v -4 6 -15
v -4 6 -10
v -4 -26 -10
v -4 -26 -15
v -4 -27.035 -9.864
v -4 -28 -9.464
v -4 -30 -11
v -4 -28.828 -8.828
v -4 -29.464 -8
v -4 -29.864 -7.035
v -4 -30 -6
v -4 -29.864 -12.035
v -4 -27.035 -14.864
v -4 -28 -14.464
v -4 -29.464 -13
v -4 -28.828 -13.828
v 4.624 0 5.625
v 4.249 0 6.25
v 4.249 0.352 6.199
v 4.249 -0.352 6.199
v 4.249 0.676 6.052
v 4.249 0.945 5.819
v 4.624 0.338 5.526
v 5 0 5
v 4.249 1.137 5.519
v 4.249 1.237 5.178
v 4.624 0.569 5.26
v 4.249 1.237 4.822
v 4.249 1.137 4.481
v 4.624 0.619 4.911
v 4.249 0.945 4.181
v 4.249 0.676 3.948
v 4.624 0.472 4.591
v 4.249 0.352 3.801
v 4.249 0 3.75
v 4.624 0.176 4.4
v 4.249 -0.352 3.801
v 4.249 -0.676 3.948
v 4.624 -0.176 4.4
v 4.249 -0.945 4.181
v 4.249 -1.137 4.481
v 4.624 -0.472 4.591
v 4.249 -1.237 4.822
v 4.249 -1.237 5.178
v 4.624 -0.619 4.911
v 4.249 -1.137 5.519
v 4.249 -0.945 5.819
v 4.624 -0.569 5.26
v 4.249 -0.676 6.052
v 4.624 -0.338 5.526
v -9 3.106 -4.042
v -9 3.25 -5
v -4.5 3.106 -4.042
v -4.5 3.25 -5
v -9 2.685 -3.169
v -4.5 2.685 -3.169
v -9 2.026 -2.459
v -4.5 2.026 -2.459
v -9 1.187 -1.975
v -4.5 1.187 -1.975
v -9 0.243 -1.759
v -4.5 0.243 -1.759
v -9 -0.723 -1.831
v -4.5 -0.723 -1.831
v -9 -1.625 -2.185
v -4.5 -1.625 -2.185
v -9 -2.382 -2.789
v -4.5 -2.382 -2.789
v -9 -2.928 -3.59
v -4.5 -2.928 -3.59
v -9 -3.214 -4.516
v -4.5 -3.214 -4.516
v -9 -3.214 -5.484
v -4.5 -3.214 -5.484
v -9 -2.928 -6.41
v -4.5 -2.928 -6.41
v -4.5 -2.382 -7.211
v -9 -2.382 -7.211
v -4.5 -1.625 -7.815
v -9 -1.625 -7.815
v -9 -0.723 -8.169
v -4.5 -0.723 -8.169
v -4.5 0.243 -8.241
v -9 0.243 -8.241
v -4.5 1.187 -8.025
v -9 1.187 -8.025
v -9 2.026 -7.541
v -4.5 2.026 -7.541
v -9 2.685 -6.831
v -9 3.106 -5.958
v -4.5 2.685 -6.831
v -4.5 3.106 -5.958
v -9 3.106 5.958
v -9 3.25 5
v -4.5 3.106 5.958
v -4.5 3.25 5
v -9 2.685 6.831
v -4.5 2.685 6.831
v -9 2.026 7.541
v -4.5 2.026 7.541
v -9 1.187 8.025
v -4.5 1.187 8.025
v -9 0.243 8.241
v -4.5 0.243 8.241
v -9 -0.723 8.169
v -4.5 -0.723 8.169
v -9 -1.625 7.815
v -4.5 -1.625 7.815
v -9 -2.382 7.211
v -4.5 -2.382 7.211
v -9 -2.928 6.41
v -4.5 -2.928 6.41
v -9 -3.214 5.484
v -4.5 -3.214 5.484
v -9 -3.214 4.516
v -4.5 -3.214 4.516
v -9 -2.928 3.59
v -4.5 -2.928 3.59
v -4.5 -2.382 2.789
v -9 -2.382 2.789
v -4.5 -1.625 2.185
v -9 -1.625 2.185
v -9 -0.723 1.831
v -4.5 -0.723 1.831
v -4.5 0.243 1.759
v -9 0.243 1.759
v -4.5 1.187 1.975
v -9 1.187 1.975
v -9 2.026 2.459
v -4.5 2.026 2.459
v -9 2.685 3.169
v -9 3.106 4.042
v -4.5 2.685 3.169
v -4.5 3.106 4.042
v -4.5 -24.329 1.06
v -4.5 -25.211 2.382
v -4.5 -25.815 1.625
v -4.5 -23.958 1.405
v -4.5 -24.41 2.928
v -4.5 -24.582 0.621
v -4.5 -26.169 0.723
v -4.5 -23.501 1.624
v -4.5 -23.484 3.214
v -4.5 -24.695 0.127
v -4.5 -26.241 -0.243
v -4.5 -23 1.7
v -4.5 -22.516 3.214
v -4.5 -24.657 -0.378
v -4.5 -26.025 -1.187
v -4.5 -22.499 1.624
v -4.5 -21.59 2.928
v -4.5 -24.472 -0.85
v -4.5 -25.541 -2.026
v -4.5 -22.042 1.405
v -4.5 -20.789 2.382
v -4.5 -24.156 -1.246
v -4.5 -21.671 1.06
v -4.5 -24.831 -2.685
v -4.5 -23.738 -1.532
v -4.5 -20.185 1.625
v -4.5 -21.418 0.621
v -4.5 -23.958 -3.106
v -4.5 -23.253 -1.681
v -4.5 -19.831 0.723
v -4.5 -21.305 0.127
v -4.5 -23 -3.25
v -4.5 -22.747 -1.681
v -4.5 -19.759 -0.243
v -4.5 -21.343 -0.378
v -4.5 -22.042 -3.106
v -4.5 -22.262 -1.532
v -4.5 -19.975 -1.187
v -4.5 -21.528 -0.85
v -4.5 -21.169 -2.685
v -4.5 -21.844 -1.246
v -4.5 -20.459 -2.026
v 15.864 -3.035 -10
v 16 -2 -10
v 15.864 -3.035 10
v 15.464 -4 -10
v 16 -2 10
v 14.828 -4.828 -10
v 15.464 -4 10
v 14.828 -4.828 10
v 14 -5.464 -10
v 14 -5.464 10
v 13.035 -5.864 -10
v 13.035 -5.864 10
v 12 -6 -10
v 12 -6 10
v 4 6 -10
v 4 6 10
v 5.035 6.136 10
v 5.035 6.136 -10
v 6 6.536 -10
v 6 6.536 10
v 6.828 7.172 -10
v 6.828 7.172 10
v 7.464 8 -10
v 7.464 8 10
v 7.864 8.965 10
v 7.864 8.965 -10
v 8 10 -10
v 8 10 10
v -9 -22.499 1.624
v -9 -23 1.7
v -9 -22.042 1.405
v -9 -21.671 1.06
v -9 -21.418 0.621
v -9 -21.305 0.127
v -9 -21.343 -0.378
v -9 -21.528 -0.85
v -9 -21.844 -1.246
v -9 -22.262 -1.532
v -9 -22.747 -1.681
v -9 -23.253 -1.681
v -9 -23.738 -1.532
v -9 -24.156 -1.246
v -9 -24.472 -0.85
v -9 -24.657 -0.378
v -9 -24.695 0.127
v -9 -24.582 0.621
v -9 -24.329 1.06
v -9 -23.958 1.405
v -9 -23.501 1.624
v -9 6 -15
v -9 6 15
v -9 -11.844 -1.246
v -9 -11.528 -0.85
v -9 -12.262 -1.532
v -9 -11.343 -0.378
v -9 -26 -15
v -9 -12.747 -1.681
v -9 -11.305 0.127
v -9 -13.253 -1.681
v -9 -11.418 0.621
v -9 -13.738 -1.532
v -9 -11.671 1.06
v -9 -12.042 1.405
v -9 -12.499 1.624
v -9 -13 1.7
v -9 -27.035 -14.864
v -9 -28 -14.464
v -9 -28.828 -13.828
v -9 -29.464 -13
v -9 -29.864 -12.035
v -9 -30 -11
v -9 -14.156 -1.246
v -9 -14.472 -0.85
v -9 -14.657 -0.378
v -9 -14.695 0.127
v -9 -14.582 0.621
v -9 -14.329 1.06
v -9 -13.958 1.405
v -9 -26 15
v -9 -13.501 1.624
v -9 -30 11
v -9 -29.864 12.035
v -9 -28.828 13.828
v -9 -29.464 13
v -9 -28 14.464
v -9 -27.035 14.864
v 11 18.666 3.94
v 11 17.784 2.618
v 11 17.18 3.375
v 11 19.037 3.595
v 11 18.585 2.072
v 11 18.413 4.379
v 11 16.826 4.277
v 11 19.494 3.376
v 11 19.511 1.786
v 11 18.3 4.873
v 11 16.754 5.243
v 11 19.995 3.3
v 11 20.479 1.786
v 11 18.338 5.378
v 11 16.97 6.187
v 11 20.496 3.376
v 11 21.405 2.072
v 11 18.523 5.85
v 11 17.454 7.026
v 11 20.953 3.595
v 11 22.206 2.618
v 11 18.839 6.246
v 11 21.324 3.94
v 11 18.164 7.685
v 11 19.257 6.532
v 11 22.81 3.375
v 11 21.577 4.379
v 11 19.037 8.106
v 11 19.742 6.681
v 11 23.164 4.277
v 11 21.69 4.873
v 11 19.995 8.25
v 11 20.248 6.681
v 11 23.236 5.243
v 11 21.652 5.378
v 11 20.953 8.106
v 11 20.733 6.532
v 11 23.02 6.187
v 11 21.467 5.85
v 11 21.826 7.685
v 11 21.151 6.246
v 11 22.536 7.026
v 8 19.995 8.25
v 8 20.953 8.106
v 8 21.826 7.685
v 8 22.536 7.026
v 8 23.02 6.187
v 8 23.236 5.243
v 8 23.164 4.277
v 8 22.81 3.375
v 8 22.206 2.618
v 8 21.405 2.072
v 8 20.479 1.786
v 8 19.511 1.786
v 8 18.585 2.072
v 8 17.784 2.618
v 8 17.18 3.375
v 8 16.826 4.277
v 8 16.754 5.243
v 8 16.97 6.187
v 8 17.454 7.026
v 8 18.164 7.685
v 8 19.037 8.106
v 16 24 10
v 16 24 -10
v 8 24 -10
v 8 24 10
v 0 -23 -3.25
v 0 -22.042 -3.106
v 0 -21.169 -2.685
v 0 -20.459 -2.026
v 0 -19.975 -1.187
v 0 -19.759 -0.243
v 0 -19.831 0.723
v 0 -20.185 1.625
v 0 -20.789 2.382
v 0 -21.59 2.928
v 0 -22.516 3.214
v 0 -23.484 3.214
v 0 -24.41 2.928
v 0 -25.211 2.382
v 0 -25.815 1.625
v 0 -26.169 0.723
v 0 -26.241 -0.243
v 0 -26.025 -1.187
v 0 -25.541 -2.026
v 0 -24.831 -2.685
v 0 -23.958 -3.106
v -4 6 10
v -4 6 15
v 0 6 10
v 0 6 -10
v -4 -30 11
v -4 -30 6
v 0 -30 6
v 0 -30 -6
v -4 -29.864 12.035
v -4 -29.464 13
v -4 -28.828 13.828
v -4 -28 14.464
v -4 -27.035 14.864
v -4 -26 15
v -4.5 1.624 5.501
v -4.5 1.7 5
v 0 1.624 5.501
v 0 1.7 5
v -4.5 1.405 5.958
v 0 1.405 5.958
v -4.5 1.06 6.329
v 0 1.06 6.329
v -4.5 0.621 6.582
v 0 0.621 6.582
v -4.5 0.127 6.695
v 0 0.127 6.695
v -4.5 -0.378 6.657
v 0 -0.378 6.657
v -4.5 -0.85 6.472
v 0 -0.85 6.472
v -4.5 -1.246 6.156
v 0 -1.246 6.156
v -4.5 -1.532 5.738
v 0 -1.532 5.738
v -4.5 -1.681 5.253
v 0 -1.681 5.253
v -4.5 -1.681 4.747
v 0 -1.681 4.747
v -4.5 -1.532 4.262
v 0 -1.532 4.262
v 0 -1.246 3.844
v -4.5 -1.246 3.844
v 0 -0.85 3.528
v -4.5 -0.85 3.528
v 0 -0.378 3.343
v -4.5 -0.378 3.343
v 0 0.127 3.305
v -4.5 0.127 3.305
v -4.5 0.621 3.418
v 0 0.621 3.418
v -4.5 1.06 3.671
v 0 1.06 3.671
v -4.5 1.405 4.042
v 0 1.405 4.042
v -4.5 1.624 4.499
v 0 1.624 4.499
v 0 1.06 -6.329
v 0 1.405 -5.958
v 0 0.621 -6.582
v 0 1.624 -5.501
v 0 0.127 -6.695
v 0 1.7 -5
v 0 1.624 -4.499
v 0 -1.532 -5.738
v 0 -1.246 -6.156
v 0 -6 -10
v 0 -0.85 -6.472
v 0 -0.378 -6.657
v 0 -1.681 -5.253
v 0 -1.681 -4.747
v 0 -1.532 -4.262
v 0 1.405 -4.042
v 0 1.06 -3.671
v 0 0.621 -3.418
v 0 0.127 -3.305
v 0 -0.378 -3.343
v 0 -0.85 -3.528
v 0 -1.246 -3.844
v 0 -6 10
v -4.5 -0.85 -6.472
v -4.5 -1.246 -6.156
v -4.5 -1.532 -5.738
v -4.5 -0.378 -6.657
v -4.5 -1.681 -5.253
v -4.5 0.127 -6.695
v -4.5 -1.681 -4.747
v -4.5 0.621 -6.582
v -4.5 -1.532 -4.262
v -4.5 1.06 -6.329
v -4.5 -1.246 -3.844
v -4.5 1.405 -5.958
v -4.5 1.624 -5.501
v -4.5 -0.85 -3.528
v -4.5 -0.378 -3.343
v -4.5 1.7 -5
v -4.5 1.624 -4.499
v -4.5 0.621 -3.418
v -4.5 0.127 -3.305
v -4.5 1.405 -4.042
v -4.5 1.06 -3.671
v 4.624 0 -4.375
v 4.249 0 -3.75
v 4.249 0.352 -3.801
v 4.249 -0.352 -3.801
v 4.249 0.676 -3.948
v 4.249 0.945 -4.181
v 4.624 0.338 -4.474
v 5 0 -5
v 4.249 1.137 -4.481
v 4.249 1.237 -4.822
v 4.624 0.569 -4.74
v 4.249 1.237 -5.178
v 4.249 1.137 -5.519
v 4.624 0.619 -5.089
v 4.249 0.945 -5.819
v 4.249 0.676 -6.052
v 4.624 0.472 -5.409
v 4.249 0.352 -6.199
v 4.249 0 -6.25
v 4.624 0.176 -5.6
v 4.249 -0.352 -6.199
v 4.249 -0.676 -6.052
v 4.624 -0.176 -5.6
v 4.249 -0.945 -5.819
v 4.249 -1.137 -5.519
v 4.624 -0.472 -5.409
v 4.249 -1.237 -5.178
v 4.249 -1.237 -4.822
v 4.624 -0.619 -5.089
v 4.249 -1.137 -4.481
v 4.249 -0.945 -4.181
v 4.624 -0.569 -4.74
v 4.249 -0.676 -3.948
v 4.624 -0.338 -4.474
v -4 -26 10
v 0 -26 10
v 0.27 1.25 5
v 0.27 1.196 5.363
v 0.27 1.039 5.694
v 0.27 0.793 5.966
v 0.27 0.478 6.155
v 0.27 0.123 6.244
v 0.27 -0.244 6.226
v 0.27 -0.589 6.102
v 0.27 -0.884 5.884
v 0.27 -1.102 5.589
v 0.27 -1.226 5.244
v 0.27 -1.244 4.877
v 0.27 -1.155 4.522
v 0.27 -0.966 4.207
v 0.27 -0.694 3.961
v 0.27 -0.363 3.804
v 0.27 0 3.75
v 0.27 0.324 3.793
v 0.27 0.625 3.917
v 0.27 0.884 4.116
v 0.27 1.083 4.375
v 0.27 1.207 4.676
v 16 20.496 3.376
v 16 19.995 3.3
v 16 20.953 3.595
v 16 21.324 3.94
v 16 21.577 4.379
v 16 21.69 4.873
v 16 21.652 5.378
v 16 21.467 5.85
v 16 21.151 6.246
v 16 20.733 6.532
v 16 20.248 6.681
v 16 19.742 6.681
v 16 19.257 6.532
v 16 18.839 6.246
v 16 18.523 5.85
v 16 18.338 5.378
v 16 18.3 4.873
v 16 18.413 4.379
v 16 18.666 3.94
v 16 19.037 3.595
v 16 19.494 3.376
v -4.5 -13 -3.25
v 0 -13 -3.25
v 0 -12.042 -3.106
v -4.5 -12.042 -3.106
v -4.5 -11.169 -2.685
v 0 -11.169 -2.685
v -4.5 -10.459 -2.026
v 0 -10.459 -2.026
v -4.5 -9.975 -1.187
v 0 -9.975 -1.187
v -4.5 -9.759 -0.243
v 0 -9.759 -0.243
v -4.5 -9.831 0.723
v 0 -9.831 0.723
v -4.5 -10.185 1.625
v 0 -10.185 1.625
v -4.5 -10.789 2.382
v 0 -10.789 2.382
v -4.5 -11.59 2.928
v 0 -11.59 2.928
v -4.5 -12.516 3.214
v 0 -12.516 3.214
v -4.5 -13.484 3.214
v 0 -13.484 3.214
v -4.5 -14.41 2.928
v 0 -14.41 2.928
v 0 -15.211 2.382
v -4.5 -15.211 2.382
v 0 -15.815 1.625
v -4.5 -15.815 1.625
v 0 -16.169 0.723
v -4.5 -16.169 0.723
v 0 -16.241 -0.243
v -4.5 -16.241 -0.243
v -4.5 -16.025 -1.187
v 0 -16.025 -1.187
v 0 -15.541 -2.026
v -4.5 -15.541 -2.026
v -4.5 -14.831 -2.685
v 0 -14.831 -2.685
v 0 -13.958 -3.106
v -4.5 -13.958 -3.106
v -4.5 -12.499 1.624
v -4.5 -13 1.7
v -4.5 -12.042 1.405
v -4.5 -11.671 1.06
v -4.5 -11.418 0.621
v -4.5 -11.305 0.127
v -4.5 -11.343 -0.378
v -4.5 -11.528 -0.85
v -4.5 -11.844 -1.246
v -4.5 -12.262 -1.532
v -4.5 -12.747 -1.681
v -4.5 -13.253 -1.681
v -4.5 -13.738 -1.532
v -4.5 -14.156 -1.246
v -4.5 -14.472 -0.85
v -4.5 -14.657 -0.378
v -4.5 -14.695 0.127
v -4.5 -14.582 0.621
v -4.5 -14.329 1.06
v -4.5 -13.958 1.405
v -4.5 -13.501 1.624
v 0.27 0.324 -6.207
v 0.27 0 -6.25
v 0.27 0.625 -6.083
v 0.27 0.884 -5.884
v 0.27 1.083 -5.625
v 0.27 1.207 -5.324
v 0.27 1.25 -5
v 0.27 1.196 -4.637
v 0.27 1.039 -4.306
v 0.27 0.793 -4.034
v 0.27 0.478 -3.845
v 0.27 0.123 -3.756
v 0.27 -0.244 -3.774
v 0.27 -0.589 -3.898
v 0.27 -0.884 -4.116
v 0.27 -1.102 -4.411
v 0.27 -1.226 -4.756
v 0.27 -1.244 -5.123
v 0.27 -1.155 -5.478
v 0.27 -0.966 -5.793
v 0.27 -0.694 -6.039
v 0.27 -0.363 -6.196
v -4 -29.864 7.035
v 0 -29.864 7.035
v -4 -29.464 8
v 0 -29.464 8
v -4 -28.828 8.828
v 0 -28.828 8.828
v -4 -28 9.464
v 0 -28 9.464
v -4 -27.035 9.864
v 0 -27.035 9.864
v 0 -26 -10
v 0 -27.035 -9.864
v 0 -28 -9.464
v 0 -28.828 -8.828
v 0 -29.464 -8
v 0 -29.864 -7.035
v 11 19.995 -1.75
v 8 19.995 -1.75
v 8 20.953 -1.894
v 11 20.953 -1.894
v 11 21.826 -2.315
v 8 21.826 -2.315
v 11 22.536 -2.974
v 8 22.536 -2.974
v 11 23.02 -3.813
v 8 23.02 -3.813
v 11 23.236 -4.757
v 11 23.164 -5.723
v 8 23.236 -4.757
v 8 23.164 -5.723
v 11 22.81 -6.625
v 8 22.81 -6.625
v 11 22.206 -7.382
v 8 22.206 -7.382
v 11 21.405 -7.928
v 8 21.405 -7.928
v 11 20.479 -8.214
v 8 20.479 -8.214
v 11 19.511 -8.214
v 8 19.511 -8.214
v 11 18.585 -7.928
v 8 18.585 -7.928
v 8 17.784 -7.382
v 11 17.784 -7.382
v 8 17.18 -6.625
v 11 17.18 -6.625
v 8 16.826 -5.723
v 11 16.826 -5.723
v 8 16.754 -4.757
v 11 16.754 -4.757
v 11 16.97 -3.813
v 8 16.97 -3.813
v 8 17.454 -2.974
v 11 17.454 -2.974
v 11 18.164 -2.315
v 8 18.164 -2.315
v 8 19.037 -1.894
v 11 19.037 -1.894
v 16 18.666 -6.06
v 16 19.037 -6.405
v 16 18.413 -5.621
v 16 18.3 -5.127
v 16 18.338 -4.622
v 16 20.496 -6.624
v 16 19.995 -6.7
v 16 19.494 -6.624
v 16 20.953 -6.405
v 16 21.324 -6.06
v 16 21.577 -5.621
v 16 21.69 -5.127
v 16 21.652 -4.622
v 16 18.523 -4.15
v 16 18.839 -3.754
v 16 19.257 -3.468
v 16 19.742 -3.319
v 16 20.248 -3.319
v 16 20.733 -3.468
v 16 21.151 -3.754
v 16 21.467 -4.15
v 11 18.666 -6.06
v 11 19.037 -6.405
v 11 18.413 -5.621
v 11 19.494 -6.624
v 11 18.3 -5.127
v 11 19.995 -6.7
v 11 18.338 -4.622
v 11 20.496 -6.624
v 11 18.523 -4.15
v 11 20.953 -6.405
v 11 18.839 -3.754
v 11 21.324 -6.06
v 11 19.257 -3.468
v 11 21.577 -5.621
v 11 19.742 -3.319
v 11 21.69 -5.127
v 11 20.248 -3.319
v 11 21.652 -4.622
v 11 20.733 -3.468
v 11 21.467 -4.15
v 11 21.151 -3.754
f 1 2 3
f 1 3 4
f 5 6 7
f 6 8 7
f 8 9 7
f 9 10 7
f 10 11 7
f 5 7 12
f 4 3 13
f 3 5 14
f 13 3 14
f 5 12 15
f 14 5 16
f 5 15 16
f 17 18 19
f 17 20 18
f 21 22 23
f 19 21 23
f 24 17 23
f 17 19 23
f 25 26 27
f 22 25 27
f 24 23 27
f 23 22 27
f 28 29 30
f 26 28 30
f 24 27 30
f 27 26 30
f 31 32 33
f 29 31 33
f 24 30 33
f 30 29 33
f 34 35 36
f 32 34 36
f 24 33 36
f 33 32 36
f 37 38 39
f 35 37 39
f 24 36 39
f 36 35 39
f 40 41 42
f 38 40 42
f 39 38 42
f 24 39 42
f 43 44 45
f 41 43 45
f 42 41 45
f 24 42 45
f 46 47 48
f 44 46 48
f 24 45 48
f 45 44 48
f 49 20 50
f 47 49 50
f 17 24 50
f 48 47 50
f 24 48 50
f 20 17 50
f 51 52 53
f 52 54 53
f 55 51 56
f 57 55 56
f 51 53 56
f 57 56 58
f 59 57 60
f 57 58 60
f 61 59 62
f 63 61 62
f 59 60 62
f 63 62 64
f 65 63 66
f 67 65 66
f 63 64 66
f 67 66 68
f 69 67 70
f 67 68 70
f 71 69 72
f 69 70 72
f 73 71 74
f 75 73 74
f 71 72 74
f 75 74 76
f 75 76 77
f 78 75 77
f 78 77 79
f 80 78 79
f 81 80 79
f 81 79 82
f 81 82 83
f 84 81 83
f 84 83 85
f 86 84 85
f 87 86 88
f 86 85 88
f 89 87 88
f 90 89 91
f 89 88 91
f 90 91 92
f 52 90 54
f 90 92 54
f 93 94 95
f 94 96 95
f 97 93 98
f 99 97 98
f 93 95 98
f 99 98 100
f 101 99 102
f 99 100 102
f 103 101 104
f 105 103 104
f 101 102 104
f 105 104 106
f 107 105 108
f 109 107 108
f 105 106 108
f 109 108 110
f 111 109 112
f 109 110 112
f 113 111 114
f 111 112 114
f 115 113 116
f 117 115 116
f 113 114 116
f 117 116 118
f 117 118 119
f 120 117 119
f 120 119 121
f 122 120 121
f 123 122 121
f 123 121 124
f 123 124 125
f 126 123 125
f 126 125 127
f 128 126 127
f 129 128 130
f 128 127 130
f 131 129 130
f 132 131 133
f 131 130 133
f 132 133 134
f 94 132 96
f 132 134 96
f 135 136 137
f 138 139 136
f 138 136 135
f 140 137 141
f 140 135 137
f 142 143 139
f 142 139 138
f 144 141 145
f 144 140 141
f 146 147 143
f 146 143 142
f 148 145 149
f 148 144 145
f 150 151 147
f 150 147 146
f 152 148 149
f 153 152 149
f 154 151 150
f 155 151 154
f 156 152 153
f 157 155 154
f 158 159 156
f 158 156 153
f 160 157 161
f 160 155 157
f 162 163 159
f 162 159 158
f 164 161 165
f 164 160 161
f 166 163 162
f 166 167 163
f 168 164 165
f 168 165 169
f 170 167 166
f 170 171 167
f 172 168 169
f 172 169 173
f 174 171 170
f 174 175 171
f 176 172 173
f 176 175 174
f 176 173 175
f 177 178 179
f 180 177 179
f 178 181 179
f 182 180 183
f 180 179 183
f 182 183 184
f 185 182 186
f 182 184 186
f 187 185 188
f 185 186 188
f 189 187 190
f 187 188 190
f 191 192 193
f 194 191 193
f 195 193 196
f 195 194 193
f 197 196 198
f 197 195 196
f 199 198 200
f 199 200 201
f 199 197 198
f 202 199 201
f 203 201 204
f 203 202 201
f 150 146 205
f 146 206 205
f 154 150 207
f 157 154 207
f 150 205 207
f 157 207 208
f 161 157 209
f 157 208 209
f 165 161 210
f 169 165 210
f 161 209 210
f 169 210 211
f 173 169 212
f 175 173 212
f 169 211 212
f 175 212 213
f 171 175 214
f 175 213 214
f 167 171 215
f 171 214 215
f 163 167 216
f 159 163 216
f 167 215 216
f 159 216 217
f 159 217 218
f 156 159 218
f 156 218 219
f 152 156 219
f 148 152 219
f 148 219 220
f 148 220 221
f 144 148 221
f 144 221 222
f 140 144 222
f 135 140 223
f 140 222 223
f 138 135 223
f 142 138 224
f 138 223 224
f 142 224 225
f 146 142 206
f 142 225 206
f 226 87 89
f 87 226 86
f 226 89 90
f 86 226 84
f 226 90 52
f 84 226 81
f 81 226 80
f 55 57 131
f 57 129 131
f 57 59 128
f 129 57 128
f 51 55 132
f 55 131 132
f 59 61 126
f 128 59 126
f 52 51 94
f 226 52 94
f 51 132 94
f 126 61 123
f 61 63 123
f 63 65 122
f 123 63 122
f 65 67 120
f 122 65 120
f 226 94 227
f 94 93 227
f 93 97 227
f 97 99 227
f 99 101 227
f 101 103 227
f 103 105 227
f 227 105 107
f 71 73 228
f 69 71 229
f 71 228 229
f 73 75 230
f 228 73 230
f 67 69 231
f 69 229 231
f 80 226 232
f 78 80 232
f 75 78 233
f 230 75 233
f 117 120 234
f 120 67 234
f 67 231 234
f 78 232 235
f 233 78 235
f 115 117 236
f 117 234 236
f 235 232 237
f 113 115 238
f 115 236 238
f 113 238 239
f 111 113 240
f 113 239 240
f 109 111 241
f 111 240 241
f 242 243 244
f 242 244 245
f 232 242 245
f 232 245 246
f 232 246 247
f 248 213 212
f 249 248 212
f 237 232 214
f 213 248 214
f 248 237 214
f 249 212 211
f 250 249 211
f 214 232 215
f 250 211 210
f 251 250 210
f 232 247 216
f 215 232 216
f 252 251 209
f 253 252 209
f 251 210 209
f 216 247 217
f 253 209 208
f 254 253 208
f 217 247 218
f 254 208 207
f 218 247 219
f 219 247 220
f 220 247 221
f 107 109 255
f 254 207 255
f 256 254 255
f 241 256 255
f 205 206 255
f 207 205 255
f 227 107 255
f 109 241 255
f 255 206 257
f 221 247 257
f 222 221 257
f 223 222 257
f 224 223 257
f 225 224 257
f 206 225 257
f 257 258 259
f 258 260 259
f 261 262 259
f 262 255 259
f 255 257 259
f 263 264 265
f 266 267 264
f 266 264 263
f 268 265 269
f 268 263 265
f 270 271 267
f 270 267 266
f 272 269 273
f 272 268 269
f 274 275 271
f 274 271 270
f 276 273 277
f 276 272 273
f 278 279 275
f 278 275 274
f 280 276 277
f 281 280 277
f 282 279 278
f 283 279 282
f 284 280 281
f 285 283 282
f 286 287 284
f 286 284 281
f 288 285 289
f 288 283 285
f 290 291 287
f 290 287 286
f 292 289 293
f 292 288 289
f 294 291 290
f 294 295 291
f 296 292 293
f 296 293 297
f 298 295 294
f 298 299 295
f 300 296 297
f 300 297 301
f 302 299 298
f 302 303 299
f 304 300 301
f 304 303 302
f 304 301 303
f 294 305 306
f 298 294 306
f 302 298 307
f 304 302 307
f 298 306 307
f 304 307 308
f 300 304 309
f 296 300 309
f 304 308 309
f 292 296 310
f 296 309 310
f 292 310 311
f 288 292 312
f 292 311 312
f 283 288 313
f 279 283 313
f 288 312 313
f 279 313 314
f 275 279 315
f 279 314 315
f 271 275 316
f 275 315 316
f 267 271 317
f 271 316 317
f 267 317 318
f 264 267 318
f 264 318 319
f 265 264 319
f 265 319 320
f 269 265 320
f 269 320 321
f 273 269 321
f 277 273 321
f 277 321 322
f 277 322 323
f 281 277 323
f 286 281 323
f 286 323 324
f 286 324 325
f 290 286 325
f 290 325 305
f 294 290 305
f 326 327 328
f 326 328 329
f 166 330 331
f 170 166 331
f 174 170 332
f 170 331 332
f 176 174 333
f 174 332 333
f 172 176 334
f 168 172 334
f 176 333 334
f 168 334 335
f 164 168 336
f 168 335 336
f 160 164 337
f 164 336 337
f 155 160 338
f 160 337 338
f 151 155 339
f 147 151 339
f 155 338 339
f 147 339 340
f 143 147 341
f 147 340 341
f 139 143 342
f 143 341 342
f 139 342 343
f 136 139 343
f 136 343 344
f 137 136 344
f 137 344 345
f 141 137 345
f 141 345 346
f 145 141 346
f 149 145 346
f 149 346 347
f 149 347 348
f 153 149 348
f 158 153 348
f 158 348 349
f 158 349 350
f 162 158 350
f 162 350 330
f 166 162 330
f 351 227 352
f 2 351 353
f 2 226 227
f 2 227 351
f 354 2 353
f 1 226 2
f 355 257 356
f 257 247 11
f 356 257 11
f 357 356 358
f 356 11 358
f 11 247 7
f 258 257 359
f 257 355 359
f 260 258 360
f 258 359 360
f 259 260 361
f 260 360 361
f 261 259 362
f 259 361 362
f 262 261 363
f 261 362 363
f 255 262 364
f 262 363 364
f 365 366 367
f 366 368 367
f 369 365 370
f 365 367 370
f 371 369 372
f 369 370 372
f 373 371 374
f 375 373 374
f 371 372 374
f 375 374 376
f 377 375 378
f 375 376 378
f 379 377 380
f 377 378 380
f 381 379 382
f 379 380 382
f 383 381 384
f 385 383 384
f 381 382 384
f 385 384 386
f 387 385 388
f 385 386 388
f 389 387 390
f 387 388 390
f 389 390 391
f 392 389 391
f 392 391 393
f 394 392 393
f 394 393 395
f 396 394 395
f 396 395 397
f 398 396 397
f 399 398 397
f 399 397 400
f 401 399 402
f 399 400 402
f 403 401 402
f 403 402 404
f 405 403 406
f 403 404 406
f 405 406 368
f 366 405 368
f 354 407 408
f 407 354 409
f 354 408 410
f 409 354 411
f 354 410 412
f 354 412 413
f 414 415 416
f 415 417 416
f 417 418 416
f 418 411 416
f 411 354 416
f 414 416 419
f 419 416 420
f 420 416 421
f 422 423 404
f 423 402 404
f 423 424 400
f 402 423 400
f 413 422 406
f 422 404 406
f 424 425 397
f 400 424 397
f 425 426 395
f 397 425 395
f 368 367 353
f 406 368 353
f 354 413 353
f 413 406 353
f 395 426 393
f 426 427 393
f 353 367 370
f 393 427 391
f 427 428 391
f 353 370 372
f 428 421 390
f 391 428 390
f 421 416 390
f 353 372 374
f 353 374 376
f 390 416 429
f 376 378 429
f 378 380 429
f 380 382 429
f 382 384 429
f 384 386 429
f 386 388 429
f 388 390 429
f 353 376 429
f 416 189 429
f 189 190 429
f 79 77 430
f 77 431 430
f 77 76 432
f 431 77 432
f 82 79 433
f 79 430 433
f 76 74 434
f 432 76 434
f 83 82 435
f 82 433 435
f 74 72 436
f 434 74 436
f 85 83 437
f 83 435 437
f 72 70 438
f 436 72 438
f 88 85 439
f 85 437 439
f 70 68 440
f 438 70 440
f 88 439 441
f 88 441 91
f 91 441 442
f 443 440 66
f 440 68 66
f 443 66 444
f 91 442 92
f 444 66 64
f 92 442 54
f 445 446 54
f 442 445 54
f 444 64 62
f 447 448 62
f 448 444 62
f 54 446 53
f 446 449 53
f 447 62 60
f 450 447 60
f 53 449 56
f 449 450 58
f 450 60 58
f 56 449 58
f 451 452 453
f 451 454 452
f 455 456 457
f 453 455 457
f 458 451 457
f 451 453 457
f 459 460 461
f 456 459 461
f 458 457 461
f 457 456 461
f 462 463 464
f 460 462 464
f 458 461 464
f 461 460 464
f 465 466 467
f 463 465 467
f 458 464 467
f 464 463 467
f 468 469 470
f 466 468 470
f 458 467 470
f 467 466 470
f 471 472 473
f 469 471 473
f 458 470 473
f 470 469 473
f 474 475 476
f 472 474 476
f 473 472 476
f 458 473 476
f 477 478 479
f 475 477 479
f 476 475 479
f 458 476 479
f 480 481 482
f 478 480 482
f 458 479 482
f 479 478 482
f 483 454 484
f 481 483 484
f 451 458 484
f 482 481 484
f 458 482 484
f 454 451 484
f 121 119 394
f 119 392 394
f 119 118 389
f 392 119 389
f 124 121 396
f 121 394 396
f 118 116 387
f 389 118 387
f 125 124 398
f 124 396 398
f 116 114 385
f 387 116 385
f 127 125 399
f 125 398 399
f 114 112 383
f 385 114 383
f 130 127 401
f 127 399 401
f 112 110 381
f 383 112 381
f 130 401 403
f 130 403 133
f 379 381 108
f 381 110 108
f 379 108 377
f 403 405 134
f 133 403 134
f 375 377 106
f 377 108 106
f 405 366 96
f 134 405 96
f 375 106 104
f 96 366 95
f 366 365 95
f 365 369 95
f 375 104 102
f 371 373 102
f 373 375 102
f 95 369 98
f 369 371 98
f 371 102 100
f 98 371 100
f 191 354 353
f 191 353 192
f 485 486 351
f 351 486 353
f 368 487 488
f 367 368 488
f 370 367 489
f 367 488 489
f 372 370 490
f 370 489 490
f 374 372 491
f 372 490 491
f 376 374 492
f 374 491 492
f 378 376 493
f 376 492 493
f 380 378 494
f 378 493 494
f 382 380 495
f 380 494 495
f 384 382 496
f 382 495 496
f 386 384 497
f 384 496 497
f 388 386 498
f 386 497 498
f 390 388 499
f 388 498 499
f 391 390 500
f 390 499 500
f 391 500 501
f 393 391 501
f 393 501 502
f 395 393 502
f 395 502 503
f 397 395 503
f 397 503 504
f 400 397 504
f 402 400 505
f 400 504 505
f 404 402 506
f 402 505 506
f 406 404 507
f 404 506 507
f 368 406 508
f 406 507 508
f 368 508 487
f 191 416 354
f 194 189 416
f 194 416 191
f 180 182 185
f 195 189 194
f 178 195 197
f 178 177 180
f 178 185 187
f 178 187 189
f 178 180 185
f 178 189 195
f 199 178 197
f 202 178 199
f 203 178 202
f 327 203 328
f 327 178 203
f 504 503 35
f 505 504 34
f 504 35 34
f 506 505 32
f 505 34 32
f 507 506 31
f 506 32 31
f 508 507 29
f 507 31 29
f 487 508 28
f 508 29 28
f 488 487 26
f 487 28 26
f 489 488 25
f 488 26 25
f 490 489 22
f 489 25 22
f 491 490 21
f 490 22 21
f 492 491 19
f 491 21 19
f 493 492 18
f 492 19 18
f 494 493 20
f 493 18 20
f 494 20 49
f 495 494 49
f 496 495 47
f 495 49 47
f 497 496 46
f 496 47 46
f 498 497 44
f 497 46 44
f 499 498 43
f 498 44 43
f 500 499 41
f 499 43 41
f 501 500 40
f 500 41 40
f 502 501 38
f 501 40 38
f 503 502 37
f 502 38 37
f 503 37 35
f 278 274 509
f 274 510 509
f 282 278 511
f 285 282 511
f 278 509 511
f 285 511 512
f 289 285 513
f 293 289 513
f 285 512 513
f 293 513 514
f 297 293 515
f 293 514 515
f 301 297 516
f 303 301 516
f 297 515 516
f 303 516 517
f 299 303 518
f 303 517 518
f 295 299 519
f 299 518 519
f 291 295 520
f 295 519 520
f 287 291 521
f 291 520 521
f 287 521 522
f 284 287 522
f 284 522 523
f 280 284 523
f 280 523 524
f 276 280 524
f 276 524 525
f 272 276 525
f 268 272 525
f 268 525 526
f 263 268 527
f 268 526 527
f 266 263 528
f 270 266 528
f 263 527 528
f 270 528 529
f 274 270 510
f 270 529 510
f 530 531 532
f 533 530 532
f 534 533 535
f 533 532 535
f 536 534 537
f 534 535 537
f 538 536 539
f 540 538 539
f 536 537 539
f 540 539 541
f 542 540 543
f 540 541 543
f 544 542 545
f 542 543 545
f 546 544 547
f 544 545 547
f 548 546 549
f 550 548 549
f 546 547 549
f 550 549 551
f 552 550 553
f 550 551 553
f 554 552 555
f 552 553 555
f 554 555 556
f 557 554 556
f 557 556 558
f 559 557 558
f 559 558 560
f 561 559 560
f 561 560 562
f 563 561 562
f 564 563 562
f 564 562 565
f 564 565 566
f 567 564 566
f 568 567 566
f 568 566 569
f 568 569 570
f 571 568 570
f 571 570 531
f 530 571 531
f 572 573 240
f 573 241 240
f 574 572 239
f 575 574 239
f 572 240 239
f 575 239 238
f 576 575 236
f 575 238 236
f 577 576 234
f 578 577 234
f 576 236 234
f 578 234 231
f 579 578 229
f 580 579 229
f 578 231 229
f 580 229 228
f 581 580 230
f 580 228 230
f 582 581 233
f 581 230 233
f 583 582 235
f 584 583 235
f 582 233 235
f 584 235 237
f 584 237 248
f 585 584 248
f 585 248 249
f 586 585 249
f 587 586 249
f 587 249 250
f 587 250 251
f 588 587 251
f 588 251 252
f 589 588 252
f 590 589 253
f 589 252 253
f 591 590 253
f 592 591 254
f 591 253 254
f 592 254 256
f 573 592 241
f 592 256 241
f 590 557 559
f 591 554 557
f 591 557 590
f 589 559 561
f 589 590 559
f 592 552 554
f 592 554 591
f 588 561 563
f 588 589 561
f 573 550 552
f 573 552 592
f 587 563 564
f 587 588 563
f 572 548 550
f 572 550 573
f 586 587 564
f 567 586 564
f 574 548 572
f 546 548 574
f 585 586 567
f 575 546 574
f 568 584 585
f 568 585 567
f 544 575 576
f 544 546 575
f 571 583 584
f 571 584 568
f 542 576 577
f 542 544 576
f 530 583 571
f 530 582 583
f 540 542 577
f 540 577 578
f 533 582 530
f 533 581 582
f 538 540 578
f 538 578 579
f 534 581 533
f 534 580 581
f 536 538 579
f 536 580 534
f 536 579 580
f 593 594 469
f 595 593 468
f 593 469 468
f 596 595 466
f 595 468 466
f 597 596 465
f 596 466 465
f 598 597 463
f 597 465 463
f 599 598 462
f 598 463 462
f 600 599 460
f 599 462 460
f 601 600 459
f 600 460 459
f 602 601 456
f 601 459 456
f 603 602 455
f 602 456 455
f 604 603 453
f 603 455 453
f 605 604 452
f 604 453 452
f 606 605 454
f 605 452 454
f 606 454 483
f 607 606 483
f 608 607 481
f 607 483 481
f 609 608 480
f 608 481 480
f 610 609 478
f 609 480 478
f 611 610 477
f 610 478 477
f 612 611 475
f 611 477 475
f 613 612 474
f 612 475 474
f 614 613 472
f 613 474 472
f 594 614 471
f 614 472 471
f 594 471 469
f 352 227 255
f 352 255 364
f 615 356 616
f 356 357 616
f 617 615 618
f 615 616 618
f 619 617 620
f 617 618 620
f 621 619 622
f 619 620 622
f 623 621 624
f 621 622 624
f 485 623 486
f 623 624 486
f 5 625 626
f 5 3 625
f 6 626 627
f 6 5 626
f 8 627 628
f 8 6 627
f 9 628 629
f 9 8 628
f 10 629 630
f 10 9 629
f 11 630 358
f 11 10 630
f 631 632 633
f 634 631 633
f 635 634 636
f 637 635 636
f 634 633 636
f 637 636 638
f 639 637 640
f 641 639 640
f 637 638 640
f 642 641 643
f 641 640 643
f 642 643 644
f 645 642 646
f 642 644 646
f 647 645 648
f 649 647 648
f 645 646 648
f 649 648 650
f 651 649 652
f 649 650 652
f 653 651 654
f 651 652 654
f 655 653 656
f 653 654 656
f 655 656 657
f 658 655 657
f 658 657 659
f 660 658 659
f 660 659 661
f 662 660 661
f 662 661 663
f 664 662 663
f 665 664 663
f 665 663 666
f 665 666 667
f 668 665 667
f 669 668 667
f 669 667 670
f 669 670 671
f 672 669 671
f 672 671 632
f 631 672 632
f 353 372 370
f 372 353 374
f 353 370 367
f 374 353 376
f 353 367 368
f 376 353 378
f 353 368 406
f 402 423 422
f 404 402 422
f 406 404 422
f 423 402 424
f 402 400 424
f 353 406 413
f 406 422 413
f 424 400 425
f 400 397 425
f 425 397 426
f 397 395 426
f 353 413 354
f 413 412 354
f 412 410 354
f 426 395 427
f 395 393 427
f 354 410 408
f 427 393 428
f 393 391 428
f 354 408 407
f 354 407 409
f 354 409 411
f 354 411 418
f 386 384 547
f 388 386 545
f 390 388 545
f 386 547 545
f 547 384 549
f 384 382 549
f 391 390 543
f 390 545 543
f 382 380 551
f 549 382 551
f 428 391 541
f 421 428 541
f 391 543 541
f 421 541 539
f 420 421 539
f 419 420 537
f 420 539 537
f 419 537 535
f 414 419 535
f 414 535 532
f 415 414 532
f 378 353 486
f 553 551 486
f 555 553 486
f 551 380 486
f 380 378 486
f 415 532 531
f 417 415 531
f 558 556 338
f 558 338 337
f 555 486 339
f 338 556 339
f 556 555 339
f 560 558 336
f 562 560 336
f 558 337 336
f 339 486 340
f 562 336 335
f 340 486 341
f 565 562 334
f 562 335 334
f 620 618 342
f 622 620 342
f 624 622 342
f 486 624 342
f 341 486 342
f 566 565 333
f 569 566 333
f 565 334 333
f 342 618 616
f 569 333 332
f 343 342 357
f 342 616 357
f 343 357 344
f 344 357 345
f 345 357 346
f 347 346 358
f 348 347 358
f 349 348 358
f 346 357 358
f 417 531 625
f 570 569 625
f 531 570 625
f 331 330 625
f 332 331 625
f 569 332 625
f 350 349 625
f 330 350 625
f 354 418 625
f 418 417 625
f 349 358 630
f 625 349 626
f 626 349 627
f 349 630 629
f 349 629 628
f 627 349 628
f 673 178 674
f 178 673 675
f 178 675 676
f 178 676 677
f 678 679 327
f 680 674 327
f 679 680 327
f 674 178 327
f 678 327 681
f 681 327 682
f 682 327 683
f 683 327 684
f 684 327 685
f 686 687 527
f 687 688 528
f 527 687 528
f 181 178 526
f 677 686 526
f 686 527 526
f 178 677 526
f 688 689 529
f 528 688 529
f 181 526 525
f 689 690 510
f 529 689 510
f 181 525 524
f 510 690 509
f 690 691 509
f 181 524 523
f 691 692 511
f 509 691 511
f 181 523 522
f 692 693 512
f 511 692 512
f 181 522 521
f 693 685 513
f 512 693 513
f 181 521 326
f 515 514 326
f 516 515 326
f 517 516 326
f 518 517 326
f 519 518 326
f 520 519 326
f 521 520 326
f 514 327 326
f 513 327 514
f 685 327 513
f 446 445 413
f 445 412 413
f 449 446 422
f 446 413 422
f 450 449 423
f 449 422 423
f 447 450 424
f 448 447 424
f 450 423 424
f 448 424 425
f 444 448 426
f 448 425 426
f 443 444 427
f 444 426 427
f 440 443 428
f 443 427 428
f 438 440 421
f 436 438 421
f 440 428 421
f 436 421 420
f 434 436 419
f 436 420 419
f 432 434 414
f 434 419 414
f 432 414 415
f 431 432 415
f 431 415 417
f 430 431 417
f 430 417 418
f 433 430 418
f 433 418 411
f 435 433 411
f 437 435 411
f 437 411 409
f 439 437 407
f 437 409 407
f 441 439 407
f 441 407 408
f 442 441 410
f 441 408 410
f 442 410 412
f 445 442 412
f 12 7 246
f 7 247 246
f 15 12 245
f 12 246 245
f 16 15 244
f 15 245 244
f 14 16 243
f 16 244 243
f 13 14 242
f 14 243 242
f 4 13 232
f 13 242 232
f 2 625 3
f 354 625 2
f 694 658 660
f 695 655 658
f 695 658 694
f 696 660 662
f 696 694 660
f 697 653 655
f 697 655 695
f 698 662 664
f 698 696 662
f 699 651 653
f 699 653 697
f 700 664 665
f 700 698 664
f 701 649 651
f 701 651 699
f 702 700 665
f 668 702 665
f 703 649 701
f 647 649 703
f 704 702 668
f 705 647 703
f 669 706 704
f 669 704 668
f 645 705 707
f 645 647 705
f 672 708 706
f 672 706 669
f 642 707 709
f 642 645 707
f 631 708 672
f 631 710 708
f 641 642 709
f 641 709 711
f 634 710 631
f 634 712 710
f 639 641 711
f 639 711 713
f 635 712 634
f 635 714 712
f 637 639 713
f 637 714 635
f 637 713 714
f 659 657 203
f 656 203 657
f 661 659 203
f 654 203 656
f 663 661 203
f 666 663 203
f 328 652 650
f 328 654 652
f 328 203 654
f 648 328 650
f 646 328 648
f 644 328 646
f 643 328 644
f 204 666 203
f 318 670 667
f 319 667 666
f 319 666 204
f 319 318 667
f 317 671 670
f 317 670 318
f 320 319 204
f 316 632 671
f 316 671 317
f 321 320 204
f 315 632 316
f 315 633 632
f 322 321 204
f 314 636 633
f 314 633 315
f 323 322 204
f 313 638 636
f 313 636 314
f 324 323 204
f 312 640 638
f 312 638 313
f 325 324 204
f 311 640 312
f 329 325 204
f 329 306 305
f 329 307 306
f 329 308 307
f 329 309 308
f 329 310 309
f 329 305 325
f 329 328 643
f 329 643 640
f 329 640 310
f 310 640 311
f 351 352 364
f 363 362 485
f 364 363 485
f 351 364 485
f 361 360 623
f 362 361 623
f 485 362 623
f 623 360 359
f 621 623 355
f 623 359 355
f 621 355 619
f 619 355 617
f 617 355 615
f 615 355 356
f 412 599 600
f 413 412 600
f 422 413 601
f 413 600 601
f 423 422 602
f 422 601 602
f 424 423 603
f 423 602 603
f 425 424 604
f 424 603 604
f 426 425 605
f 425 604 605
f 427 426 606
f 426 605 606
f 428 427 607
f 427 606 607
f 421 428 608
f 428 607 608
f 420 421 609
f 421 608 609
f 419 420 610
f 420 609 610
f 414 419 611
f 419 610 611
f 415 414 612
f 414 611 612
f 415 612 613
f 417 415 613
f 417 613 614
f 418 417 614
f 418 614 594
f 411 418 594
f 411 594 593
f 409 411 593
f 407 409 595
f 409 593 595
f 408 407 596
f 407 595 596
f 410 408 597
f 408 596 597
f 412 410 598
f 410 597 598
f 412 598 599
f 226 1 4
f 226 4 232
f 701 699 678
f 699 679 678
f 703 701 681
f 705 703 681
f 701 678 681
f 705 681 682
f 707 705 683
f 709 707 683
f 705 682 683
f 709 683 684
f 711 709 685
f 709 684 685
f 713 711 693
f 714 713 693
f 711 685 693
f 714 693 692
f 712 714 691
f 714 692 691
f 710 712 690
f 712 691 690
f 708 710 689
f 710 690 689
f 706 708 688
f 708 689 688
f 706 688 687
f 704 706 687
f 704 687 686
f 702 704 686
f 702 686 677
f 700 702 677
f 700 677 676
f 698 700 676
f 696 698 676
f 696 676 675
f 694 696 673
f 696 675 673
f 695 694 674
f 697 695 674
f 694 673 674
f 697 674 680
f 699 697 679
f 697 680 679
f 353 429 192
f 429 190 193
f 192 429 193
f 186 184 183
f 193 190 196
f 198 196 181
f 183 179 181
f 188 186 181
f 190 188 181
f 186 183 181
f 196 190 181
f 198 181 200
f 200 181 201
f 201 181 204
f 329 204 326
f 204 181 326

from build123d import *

# Parameters (mm, degrees)
BOSS_EXTRUDE1_DEPTH             = 10
BOSS_EXTRUDE2_DEPTH             = 6
BOSS_EXTRUDE2_DEPTH_BACK        = 30
BOSS_EXTRUDE4_START             = -8
SKETCH7_W                       = 20
SKETCH7_H                       = 10
BOSS_EXTRUDE4_DEPTH             = 8
CBORE_FOR_M3_SHCS11_D           = 3.4
CBORE_FOR_M3_SHCS11_CBORE_D     = 6.5
CBORE_FOR_M3_SHCS11_CBORE_DEPTH = 4.5
M3X0_5_TAPPED_HOLE1_D           = 2.5
M3X0_5_TAPPED_HOLE1_DEPTH       = 13.248924226
M3X0_5_TAPPED_HOLE1_TIP         = 0.751075774
FILLET3_R                       = 4
FILLET4_R                       = 4
CBORE_FOR_M3_SHCS13_D           = 3.4
CBORE_FOR_M3_SHCS13_DEPTH       = 20
CBORE_FOR_M3_SHCS13_CBORE_D     = 6.5
CBORE_FOR_M3_SHCS13_CBORE_DEPTH = 3
CBORE_FOR_M3_SHCS13_TIP         = 1.021463052


# Read off the part's stored shape, not the designer's step: CBORE for M3 SHCS12
with BuildPart() as part:
    # Sketch1 → Boss-Extrude1 (new, symmetric)
    with BuildSketch(Plane.XY):
        Polygon((16, -6), (0, -6), (0, 6), (8, 6), (8, 14), (16, 14), align=None)
    extrude(amount=BOSS_EXTRUDE1_DEPTH, both=True)

    # Sketch2 → Boss-Extrude2 (add, two sides: drawn at the far end of the back side and taken through both)
    with BuildSketch(Plane(origin=(0, 0, 0), x_dir=(1, 0, 0), z_dir=(0, 1, 0)).offset(-BOSS_EXTRUDE2_DEPTH_BACK)):
        Polygon((-4, 15), (-9, 15), (-9, -15), (-4, -15), (-4, -10), (0, -10), (0, 10), (-4, 10), align=None)
    extrude(amount=BOSS_EXTRUDE2_DEPTH + BOSS_EXTRUDE2_DEPTH_BACK)

    # Sketch7 → Boss-Extrude4 (add)
    with BuildSketch(Plane.ZY.offset(-8).offset(BOSS_EXTRUDE4_START)):
        with Locations((0, 19)):
            Rectangle(SKETCH7_W, SKETCH7_H)
    extrude(amount=BOSS_EXTRUDE4_DEPTH)

    # CBORE for M3 SHCS11 (through all)
    with Locations(Plane(origin=(0, 0, 0), x_dir=(0, 0, -1), z_dir=(1, 0, 0))):
        with Locations((0, -13), (0, -23)):
            CounterBoreHole(CBORE_FOR_M3_SHCS11_D / 2, CBORE_FOR_M3_SHCS11_CBORE_D / 2, CBORE_FOR_M3_SHCS11_CBORE_DEPTH)

    # M3x0.5 Tapped Hole1
    with Locations(Plane.ZY.offset(9)):
        with Locations((-5, 0), (5, 0)):
            Hole(M3X0_5_TAPPED_HOLE1_D / 2, depth=M3X0_5_TAPPED_HOLE1_DEPTH)
            with Locations((0, 0, -(M3X0_5_TAPPED_HOLE1_DEPTH + M3X0_5_TAPPED_HOLE1_TIP / 2))):  # 118° drill point
                Cone(0, M3X0_5_TAPPED_HOLE1_D / 2, M3X0_5_TAPPED_HOLE1_TIP, mode=Mode.SUBTRACT)

    # CBORE for M3 SHCS12 outline → CBORE for M3 SHCS12 (revolve, cut)
    with BuildSketch(Plane.YX.offset(-5)):
        Polygon((1.7, 0), (1.25, 0.270387279), (1.25, -9), (3.25, -9), (3.25, -4.5), (1.7, -4.5), align=None)
    revolve(axis=Axis((0, 0, 5), (1, 0, 0)), mode=Mode.SUBTRACT)

    # CBORE for M3 SHCS12 2 outline → CBORE for M3 SHCS12 2 (revolve, cut)
    with BuildSketch(Plane.YX.offset(5)):
        Polygon((1.25, -9), (3.25, -9), (3.25, -4.5), (1.7, -4.5), (1.7, 0), (1.25, 0.270387279), align=None)
    revolve(axis=Axis((0, 0, -5), (1, 0, 0)), mode=Mode.SUBTRACT)

    # Fillet3
    fillet3_edges = [part.edges().sort_by_distance(p)[0] for p in [
        (16, -6, 0),
        (8, 6, 0),
    ]]
    fillet(fillet3_edges, radius=FILLET3_R)

    # Fillet4
    fillet4_edges = [part.edges().sort_by_distance(p)[0] for p in [
        (-2, -30, -10),
        (-2, -30, 10),
        (-6.5, -30, 15),
        (-6.5, -30, -15),
    ]]
    fillet(fillet4_edges, radius=FILLET4_R)

    # CBORE for M3 SHCS13
    with Locations(Plane(origin=(8, -16.5, 0), x_dir=(0, 0, 1), z_dir=(-1, 0, 0))):
        with Locations((-5, 36.495), (5, 36.495)):
            CounterBoreHole(CBORE_FOR_M3_SHCS13_D / 2, CBORE_FOR_M3_SHCS13_CBORE_D / 2, CBORE_FOR_M3_SHCS13_CBORE_DEPTH, depth=CBORE_FOR_M3_SHCS13_DEPTH)
            with Locations((0, 0, -(CBORE_FOR_M3_SHCS13_DEPTH + CBORE_FOR_M3_SHCS13_TIP / 2))):  # 118° drill point
                Cone(0, CBORE_FOR_M3_SHCS13_D / 2, CBORE_FOR_M3_SHCS13_TIP, mode=Mode.SUBTRACT)


with BuildPart() as body_2:
    # Split1: the piece on the far side of the plane
    add(part.part)
    split(bisect_by=Plane(origin=(0, 0, 0), x_dir=(0, 0, 1), z_dir=(1, 0, 0)), keep=Keep.BOTTOM)


with BuildPart() as part_1:
    add(part.part)

    # Split1
    split(bisect_by=Plane(origin=(0, 0, 0), x_dir=(0, 0, 1), z_dir=(1, 0, 0)), keep=Keep.TOP)


solid = Compound([body_2.part, part_1.part])
